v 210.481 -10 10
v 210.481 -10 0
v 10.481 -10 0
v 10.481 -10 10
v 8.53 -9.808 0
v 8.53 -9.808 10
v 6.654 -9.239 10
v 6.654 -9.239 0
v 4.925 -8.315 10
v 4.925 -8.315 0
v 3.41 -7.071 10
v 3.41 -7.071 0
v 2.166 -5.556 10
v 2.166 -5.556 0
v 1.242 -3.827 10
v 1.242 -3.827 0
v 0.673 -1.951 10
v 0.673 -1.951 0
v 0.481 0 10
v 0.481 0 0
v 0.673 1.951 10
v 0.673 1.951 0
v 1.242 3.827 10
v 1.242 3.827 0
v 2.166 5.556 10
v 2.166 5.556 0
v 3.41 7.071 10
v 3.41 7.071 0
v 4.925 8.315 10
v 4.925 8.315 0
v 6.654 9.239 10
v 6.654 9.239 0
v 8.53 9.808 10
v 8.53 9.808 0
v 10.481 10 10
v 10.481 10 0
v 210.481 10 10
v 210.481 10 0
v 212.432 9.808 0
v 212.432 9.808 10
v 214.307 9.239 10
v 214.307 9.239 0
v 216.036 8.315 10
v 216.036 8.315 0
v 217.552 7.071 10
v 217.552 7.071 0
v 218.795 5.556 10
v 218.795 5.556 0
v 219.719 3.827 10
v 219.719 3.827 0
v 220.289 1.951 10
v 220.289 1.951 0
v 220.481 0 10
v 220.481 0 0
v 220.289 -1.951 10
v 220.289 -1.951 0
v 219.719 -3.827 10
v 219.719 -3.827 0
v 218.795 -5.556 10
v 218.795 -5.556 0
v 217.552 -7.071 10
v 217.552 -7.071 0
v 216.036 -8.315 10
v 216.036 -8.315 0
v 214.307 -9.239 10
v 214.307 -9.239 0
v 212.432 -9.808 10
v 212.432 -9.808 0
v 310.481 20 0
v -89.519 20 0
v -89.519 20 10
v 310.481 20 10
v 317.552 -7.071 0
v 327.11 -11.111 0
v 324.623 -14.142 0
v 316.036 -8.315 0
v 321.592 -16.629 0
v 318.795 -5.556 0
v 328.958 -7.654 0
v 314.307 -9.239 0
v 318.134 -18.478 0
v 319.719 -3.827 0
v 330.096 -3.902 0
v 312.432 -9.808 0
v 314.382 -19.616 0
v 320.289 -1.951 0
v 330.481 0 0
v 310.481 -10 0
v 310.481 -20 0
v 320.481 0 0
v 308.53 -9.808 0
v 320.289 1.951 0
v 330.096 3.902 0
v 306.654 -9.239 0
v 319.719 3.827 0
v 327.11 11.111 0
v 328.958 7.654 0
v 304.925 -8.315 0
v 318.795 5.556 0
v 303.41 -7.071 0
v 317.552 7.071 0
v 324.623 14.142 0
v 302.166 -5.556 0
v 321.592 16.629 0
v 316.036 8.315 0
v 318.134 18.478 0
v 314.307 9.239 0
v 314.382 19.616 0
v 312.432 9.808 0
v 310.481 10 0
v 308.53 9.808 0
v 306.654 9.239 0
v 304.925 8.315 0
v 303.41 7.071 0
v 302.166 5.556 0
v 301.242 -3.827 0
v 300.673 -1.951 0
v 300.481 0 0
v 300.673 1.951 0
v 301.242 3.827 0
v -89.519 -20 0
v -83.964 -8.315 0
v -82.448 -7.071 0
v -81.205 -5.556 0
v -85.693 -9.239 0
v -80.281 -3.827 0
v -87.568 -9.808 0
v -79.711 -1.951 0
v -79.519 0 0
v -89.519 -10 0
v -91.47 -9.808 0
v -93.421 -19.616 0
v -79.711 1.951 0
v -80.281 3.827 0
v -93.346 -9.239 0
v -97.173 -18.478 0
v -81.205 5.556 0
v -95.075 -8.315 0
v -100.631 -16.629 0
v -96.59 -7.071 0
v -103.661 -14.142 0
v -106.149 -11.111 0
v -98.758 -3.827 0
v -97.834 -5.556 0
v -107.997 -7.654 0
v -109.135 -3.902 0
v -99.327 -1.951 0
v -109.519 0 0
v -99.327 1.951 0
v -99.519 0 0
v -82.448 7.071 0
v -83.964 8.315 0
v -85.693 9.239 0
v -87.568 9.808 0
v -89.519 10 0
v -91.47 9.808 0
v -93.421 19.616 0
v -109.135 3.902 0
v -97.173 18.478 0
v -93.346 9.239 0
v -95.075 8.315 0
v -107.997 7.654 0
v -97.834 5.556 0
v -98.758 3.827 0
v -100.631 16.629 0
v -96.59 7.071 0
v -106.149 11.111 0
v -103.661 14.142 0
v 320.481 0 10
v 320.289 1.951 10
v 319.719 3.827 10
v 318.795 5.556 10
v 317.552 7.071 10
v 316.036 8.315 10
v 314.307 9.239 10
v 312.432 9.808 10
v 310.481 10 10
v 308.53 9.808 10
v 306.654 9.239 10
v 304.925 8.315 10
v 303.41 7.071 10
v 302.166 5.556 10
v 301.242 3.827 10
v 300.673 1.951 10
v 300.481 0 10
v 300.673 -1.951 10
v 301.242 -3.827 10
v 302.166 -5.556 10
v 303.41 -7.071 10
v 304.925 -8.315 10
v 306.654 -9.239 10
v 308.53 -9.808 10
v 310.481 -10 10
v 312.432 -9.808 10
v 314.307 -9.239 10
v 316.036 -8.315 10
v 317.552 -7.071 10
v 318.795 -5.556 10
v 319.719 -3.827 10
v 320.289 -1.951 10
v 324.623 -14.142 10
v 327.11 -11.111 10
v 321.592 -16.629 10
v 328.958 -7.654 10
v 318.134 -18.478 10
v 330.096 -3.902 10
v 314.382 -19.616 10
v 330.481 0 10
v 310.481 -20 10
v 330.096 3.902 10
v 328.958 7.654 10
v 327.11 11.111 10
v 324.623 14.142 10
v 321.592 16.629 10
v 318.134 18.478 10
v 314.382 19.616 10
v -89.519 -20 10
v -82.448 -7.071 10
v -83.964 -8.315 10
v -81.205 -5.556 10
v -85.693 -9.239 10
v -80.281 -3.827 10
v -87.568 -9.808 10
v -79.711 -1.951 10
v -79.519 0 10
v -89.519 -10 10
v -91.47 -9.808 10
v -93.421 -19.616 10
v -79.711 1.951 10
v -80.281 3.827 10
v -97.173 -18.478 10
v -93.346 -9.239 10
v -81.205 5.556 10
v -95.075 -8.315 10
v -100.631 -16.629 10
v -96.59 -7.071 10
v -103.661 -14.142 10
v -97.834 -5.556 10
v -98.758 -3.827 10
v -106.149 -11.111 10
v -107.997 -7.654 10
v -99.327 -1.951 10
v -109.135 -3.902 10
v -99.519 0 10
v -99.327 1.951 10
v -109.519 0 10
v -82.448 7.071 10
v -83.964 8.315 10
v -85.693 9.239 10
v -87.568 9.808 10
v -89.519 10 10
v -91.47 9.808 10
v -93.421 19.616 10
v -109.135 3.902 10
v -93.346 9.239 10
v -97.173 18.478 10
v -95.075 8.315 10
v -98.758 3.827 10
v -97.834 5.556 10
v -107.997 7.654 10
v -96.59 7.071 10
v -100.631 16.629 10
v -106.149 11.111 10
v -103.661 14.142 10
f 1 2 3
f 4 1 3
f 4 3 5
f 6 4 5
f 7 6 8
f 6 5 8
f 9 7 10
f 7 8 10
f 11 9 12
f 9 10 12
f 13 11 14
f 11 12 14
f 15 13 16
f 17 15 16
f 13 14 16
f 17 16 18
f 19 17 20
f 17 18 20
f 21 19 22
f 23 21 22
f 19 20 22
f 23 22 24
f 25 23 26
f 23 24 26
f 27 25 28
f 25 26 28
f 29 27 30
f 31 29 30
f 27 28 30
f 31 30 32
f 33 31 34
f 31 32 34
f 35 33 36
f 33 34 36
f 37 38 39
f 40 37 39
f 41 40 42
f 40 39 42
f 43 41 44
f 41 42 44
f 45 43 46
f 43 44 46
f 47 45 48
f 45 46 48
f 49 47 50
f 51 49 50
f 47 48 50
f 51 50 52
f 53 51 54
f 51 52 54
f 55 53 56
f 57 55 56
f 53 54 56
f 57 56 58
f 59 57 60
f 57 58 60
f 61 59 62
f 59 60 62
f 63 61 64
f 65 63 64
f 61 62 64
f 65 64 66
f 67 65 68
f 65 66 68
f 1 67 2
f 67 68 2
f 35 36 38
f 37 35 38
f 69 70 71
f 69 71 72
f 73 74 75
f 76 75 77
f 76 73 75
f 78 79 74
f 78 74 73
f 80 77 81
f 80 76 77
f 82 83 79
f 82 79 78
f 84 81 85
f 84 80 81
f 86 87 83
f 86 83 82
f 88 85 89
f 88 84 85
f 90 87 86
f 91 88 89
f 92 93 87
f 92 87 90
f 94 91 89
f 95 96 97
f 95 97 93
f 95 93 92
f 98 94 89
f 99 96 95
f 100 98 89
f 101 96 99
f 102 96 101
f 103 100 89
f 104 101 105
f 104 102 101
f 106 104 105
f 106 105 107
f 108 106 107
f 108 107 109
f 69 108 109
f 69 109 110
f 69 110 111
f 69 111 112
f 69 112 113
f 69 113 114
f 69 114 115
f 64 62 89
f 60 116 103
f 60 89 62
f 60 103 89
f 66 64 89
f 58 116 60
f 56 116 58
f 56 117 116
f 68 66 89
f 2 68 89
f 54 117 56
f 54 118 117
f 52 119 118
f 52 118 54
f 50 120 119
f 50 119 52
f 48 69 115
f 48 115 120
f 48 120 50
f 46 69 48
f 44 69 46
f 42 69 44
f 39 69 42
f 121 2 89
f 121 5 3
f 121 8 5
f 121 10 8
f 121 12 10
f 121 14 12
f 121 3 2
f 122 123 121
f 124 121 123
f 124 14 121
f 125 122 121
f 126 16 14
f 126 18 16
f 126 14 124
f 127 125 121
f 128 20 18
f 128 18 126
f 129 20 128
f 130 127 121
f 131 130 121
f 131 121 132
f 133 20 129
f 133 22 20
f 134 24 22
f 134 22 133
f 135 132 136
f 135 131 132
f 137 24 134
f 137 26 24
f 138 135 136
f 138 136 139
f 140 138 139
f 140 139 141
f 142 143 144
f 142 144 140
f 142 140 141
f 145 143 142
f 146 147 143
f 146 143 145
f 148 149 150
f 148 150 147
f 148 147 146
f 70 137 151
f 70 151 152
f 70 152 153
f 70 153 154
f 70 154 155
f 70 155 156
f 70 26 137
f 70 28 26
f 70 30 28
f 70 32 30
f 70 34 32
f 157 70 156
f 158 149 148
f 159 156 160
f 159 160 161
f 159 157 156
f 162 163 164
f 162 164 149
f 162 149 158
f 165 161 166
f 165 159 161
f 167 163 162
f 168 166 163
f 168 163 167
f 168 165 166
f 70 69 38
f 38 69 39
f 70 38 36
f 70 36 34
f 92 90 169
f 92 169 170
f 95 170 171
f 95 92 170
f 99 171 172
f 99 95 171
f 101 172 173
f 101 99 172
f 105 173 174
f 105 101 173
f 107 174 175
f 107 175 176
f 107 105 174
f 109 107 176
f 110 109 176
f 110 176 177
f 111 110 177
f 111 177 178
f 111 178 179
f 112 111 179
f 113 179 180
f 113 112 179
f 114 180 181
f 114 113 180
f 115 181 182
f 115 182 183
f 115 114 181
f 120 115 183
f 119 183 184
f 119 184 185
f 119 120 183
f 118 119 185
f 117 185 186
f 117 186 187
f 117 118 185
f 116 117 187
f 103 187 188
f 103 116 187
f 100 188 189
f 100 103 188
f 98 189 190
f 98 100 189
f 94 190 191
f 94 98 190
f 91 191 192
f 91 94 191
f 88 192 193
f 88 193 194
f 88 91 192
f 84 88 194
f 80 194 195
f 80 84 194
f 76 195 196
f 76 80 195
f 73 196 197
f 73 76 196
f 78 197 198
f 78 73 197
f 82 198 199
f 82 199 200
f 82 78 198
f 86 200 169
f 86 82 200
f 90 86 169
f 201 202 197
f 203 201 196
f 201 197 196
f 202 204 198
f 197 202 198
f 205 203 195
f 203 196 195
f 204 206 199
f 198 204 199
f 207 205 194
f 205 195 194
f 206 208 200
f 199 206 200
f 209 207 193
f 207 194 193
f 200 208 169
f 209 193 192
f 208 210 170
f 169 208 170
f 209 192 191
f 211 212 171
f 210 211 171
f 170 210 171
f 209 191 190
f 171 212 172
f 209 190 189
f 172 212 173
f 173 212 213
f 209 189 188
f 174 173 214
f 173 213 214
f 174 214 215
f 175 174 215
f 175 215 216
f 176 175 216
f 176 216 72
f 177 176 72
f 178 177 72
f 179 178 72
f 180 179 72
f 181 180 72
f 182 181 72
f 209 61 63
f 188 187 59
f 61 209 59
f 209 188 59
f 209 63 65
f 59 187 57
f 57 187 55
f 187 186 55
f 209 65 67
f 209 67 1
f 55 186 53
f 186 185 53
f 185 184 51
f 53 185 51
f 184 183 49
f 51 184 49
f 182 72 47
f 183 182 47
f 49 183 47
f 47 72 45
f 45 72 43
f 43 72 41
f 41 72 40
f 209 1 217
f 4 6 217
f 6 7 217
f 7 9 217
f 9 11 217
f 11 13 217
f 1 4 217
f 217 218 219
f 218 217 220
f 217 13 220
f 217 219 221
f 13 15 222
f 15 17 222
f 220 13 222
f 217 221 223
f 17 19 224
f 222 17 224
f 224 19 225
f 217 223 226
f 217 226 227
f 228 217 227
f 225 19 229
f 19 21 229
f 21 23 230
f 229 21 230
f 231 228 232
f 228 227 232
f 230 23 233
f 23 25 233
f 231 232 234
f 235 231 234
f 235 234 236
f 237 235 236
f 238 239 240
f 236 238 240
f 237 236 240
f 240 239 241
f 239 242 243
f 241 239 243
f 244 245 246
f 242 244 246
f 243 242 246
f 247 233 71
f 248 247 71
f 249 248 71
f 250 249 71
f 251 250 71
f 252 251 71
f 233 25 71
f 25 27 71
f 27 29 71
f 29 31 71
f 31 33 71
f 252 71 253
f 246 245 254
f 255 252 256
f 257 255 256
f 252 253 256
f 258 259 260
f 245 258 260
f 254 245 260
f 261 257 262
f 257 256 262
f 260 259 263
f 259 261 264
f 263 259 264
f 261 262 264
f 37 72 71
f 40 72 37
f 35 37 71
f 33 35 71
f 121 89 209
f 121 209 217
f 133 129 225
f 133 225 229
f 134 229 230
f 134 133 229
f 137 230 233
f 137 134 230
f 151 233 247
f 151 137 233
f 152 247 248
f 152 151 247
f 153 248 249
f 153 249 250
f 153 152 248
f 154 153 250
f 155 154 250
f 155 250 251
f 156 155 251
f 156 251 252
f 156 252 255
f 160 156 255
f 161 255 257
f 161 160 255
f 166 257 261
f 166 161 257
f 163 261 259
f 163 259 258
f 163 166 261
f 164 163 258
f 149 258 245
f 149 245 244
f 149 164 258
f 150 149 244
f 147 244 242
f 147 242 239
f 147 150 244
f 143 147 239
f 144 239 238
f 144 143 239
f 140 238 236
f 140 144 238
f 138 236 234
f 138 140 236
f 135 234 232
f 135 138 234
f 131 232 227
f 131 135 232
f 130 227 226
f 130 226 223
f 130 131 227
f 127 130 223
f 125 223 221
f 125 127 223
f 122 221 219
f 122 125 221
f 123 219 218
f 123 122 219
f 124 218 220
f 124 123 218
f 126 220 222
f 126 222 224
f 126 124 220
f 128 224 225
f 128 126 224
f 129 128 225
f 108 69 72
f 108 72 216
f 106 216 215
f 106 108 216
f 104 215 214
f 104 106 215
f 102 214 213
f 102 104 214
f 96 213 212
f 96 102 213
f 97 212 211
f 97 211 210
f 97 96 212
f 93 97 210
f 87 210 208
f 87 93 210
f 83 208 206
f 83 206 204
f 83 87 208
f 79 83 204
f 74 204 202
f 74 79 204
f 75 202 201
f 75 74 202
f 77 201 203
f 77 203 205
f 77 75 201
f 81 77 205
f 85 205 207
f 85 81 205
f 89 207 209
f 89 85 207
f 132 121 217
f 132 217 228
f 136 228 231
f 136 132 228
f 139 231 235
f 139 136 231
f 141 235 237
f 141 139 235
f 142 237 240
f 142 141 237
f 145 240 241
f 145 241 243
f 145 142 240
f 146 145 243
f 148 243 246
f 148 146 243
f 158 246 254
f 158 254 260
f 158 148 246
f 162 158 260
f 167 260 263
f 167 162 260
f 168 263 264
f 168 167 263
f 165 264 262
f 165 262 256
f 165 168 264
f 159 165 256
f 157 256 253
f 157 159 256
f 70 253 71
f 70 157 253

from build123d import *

# Parameters (mm, degrees)
SKETCH1_R           = 10
BOSS_EXTRUDE1_DEPTH = 10


with BuildPart() as part:
    # Sketch1 → Boss-Extrude1 (new body)
    with BuildSketch(Plane.XY):
        with BuildLine():
            Line((-89.519341996, 20), (310.480658004, 20))
            ThreePointArc((310.480658004, 20), (330.480658004, 0), (310.480658004, -20))
            Line((310.480658004, -20), (-89.519341996, -20))
            ThreePointArc((-89.519341996, -20), (-109.519341996, 0), (-89.519341996, 20))
        make_face()
        with Locations((-89.519341996, 0)):
            Circle(SKETCH1_R, mode=Mode.SUBTRACT)
        with Locations((310.480658004, 0)):
            Circle(SKETCH1_R, mode=Mode.SUBTRACT)
        with BuildLine():
            Line((10.480658004, 10), (210.480658004, 10))
            ThreePointArc((210.480658004, 10), (220.480658004, 0), (210.480658004, -10))
            Line((210.480658004, -10), (10.480658004, -10))
            ThreePointArc((10.480658004, -10), (0.480658004, 0), (10.480658004, 10))
        make_face(mode=Mode.SUBTRACT)
    extrude(amount=BOSS_EXTRUDE1_DEPTH)


solid = part.part
